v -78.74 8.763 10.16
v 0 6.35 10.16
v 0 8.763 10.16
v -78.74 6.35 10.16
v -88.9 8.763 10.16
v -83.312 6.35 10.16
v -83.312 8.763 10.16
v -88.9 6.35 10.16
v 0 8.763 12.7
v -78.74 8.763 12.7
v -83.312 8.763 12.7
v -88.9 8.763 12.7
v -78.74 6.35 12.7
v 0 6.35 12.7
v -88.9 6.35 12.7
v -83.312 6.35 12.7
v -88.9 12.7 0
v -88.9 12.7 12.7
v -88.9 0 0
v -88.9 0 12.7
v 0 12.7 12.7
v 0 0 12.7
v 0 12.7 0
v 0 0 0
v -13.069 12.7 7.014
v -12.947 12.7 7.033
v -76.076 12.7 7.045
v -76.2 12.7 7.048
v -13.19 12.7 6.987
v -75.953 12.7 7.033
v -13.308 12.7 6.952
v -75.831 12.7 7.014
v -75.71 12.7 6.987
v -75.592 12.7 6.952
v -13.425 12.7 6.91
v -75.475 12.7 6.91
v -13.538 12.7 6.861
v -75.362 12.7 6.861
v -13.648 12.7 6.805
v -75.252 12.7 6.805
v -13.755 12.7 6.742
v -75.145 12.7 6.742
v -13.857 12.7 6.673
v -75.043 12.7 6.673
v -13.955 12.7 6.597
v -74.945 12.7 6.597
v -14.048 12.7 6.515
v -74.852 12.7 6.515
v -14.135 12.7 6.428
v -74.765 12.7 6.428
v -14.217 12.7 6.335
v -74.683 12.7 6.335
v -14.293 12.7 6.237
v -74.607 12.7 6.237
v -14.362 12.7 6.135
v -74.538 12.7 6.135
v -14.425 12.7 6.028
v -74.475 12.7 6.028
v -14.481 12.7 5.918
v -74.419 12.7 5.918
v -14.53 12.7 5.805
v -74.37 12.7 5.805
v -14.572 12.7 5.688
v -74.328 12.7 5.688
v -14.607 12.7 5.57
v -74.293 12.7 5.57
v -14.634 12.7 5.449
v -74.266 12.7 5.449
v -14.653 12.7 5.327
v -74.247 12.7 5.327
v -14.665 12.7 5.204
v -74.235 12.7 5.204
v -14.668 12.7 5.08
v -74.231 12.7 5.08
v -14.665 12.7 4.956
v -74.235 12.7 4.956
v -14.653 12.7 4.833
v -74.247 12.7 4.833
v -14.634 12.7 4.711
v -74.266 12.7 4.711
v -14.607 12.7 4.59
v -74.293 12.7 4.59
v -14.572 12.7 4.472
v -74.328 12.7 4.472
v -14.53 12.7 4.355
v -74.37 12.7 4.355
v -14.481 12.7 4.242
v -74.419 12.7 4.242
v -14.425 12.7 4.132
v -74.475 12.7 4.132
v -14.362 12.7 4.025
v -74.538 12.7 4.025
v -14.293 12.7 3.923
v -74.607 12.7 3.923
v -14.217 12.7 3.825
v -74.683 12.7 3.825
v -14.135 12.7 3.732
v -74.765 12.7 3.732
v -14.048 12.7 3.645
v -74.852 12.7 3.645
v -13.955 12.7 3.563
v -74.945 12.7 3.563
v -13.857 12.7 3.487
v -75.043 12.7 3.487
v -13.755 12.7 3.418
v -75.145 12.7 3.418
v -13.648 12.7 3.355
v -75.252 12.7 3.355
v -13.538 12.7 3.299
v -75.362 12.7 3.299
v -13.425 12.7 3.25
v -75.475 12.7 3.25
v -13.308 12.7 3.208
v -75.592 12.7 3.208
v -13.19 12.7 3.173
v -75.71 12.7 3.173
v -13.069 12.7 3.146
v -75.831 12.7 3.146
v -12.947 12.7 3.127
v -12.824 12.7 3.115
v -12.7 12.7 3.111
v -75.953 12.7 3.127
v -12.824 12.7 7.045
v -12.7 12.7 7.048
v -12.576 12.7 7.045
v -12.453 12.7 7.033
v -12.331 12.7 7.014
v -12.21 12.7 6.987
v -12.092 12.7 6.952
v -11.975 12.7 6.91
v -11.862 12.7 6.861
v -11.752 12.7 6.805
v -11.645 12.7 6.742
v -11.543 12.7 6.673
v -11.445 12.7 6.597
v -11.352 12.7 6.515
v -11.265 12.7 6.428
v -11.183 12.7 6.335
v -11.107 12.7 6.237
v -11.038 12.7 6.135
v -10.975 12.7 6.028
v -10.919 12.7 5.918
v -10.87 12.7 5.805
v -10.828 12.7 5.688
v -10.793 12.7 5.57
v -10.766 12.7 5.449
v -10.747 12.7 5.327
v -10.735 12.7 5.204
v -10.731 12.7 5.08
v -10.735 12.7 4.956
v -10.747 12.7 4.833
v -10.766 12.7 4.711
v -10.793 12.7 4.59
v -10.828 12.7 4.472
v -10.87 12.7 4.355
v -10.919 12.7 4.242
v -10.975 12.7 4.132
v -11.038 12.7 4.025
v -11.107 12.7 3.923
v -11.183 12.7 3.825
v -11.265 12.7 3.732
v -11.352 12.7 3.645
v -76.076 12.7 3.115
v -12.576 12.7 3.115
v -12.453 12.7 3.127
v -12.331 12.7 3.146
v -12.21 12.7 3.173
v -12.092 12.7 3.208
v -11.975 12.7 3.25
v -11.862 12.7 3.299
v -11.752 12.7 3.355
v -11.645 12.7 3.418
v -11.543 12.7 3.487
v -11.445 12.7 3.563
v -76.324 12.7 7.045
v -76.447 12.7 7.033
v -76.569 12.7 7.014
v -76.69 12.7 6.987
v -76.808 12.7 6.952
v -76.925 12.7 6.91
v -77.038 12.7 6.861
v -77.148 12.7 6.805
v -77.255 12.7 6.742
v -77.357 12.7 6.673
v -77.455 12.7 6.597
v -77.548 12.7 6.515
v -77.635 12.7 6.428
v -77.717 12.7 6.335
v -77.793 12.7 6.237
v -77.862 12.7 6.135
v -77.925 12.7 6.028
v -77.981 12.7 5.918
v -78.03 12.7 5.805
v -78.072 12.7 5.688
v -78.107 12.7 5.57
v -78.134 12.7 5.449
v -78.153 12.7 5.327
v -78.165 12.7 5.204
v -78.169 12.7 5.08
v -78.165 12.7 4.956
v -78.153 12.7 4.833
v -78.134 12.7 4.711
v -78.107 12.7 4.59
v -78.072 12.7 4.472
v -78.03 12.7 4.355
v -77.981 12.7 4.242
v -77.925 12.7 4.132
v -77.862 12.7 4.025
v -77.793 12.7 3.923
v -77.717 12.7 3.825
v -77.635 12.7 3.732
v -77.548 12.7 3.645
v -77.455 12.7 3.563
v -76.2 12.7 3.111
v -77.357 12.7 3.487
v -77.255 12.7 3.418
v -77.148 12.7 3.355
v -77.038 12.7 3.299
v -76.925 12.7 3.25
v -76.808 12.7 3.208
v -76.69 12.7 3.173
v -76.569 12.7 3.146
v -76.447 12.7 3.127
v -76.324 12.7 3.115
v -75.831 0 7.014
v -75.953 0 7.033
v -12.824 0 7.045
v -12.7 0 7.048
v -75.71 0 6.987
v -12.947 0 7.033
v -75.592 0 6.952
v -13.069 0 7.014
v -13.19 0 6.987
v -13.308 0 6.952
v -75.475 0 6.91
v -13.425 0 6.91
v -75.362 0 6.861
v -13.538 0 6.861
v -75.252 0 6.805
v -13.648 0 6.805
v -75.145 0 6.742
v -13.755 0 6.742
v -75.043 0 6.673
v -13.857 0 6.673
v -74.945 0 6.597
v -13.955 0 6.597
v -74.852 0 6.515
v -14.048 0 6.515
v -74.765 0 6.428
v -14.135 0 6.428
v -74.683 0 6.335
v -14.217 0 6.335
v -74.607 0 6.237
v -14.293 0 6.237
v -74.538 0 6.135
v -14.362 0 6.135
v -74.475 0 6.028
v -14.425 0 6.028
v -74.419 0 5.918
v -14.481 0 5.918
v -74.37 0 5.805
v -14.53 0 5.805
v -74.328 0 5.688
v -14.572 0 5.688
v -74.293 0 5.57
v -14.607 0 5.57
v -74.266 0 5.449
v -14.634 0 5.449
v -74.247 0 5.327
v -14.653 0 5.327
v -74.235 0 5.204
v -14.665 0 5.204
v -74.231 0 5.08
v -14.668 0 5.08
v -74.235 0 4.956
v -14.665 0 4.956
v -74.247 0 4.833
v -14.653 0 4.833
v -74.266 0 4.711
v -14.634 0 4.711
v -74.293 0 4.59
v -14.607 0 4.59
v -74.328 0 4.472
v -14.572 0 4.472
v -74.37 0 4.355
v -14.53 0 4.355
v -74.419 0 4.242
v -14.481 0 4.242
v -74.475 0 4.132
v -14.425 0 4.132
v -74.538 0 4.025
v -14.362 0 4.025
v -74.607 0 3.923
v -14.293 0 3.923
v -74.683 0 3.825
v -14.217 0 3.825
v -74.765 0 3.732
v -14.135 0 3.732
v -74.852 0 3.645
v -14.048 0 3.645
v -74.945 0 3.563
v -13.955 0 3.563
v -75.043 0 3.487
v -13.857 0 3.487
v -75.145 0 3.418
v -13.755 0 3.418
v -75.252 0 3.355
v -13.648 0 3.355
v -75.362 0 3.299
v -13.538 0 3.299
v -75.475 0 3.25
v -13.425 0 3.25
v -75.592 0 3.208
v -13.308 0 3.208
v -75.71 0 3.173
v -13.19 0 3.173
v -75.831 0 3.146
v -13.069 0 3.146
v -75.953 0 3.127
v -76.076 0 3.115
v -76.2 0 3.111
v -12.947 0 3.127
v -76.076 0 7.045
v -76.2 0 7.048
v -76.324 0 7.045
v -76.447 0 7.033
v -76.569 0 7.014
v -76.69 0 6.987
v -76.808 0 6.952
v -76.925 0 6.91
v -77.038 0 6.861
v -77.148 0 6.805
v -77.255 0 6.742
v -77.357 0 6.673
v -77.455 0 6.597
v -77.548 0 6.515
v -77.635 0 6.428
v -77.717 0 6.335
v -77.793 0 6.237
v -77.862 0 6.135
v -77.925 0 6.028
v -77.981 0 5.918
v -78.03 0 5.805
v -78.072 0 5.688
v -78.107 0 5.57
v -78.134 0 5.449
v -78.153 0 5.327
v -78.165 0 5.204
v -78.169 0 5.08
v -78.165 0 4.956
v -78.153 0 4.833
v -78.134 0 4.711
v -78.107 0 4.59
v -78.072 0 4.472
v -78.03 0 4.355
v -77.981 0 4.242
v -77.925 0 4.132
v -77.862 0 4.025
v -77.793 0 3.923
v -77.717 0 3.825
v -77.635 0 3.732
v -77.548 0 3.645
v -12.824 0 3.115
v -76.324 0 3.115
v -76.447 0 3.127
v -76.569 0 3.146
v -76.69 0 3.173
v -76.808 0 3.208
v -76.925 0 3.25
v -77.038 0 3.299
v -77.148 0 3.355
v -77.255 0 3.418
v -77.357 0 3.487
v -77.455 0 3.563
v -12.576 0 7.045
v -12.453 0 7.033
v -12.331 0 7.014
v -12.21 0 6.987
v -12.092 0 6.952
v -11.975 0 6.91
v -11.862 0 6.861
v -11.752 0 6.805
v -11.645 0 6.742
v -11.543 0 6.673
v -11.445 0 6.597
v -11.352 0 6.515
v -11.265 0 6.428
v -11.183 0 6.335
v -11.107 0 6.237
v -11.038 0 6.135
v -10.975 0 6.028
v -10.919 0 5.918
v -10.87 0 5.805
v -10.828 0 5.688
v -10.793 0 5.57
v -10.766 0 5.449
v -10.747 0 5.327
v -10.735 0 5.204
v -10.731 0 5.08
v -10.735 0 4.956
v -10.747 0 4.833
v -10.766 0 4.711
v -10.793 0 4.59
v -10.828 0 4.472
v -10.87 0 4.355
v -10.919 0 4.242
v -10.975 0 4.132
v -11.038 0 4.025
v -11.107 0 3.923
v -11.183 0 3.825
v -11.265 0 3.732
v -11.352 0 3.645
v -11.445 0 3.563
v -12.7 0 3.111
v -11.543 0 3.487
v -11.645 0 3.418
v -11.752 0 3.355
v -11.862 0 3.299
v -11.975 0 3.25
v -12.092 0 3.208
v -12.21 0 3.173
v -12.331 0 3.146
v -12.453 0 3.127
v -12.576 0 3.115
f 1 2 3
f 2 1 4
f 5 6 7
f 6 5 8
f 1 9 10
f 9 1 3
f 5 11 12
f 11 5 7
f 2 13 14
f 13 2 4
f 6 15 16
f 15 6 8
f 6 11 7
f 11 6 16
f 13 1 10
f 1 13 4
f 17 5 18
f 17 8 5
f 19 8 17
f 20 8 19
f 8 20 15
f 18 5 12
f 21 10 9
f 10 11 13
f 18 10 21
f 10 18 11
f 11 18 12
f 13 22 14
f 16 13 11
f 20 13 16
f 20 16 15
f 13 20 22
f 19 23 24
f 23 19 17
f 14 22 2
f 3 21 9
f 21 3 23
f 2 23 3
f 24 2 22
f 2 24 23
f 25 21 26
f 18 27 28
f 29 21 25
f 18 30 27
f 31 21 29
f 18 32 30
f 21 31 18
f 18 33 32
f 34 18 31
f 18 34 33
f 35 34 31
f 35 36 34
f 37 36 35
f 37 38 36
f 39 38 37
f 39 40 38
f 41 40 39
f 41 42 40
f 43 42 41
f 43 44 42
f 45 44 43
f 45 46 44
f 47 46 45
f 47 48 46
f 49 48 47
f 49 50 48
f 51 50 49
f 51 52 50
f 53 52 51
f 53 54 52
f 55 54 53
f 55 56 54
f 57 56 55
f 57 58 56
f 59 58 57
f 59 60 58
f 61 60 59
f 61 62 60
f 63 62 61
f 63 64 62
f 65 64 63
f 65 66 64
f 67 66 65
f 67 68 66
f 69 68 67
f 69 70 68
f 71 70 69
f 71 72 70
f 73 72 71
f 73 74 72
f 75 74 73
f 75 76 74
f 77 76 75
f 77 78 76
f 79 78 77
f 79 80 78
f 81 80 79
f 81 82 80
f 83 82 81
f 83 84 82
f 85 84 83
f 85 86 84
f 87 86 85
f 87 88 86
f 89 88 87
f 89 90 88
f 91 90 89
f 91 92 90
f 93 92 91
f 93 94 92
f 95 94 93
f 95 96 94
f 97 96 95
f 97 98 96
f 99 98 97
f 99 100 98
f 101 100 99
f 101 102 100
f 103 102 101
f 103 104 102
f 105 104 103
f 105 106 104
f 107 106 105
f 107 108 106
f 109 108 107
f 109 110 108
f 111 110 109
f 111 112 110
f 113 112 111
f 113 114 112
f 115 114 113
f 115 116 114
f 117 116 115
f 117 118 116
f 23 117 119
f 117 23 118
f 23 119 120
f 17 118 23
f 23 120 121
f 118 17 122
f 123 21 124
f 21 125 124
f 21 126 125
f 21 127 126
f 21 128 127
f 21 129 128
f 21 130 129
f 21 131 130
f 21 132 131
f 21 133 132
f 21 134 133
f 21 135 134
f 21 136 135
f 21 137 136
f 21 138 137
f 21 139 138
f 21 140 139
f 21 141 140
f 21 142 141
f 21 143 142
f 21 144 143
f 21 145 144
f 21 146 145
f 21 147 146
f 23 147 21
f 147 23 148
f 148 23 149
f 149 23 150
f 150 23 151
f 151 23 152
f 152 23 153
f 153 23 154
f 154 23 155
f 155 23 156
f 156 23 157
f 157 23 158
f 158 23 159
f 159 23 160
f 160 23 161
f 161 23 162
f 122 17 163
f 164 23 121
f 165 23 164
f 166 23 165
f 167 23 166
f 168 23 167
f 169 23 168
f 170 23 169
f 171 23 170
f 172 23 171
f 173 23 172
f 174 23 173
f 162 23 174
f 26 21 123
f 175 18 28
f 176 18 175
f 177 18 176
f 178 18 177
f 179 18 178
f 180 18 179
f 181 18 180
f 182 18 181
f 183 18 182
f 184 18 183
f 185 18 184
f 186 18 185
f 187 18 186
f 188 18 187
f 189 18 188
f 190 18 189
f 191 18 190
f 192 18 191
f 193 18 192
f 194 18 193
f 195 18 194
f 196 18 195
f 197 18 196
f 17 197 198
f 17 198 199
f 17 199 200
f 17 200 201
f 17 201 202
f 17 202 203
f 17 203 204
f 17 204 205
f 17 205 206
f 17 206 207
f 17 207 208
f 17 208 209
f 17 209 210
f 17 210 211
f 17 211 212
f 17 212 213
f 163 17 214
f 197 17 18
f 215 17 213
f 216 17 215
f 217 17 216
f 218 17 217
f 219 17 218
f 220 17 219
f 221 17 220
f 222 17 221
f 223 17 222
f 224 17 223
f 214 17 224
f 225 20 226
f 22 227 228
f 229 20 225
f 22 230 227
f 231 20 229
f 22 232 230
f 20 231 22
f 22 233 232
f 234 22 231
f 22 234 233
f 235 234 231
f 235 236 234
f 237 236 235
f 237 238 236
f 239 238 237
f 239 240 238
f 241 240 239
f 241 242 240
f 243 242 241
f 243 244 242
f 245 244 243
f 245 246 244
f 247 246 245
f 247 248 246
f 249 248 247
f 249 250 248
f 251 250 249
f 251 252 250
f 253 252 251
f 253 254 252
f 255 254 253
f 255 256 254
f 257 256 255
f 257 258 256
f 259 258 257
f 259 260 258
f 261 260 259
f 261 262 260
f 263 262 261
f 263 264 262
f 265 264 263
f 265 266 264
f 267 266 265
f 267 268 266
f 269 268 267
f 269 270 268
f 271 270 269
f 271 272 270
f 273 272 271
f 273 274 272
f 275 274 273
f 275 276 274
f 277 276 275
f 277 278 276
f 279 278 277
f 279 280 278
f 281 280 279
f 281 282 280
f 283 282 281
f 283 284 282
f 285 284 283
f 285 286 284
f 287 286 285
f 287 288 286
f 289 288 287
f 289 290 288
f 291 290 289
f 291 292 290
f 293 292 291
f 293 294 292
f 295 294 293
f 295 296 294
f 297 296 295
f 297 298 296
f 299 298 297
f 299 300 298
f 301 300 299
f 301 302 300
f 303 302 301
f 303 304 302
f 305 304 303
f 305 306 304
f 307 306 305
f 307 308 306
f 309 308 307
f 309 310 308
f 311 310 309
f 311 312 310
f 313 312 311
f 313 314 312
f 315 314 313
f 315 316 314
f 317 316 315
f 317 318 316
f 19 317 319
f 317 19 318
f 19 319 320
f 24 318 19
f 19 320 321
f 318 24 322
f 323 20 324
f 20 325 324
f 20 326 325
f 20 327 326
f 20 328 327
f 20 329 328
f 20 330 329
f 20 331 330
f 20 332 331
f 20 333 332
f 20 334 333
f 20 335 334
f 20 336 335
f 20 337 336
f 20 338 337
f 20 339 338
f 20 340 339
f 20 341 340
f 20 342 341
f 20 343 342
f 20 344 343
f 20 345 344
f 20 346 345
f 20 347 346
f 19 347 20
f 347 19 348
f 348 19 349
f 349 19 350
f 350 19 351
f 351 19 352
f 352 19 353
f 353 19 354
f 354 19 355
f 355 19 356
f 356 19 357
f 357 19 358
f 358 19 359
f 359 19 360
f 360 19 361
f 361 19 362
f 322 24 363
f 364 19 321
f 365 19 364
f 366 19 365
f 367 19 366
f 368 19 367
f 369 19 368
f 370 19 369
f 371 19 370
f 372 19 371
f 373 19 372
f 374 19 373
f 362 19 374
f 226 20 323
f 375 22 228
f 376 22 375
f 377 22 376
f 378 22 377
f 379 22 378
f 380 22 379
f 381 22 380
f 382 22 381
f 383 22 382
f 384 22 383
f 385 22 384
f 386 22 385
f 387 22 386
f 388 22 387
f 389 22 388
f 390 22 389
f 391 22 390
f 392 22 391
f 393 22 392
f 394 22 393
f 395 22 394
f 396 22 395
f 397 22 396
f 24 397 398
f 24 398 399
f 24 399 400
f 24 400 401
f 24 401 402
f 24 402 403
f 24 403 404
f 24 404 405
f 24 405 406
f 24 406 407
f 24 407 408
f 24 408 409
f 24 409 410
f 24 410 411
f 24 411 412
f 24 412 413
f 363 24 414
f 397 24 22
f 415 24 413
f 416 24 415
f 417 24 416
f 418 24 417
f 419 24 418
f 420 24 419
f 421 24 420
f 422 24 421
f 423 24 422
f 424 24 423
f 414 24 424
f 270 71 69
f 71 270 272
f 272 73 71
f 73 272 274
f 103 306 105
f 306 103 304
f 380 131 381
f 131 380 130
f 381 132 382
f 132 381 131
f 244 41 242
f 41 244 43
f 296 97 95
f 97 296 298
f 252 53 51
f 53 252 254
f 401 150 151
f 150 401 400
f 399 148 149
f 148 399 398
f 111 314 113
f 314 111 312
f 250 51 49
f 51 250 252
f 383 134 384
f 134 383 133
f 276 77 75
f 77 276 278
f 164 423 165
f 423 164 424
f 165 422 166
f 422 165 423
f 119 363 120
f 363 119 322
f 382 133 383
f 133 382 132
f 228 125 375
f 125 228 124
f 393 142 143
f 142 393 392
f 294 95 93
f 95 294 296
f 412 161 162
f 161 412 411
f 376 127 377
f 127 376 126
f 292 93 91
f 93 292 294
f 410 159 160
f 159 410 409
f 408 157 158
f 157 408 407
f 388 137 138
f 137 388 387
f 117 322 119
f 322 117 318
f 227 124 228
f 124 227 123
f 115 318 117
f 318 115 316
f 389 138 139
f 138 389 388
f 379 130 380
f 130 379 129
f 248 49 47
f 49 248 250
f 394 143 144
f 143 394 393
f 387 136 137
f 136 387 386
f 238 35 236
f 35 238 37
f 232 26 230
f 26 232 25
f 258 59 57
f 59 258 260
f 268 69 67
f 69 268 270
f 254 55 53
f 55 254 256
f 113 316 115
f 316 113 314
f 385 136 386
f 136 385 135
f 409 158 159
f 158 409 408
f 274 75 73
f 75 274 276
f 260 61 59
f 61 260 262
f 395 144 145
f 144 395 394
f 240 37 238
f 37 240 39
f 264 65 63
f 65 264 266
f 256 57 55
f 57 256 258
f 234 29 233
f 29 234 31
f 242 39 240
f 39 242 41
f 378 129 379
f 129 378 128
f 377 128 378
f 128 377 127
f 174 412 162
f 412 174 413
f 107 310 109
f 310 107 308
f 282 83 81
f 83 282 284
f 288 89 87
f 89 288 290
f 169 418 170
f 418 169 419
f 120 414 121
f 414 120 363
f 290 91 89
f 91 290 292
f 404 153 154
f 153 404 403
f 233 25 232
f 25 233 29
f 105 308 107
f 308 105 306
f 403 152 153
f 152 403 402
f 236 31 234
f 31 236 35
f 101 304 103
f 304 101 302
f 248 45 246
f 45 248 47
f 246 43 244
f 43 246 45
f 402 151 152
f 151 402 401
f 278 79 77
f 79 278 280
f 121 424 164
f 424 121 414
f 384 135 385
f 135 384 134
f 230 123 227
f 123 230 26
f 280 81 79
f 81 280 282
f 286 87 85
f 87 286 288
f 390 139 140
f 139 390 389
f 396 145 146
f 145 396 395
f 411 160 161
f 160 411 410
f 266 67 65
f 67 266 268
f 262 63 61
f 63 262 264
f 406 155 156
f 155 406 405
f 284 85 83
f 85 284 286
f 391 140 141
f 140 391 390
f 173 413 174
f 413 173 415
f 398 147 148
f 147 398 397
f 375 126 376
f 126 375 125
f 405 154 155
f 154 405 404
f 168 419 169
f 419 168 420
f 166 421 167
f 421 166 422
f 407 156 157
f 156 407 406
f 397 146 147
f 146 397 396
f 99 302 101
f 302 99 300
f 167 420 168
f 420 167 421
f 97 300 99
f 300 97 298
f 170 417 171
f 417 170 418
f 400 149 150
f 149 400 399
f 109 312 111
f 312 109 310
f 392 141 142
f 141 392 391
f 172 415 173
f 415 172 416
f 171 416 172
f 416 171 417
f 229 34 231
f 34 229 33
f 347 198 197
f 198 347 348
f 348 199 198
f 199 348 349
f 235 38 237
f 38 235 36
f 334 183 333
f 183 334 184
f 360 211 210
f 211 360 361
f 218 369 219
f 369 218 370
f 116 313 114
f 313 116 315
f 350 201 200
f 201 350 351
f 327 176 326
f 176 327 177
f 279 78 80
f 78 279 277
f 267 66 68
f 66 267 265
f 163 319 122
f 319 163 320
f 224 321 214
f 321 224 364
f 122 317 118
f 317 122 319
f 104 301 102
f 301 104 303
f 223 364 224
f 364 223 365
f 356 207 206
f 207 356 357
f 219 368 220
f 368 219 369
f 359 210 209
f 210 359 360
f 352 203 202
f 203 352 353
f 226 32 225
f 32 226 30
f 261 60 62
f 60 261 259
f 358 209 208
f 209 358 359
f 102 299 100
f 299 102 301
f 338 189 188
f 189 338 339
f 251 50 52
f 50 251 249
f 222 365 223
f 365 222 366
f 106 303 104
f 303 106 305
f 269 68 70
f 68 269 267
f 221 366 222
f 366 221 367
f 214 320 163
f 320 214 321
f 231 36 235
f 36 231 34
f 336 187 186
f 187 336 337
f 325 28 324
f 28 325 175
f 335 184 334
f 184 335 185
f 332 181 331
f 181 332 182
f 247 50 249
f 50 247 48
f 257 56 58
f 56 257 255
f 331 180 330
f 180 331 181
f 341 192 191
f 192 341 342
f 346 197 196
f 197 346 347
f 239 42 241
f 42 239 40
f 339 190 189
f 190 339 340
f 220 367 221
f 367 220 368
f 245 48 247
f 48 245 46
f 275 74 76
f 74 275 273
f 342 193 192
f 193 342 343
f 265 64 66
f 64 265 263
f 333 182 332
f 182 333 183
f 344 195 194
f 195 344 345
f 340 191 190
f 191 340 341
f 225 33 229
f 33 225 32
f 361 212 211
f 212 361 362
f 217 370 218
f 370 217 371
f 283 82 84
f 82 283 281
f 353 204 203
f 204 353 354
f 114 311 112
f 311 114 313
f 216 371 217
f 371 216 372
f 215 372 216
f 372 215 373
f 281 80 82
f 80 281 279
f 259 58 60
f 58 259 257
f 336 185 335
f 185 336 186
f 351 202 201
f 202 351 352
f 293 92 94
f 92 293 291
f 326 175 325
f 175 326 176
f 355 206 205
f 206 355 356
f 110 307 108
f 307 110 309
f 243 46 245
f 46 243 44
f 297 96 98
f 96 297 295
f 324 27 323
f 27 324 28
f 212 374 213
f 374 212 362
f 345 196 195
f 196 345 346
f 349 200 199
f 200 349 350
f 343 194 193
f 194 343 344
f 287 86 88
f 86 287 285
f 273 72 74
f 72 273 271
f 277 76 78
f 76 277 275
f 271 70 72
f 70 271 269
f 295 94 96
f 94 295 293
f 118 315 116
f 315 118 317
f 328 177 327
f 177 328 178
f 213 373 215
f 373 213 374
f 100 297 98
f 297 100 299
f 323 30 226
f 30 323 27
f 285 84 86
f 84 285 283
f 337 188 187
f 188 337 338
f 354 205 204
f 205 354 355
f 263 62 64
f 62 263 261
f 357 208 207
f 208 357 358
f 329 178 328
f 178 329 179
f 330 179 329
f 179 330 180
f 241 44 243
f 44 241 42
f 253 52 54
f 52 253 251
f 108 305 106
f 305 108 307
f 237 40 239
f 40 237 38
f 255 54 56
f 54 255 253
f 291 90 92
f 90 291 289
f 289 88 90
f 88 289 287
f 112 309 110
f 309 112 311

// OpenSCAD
/* OpenSCAD file to make a pair of rails to hold
 * one of my Antminer X9 boards
 * Tom Trebisky  5-10-2026
 */

/* I design this so it will print slot upwards
 */

// right = true;
right = false;

mmpi = 25.4;
function mm(x) = x * mmpi;

l = mm ( 3.5 );		// length along the PCB
h = mm ( 0.5 );		// thickness
w = mm ( 0.5 );		// perpendicular to card edge
up = mm ( 0.4 );
shift = mm ( 0.25 );
half = mm ( 0.5 );

// [left/right, front/back, up/down ]

slice = mm ( 0.095 );
big1 = mm ( 1.0 );
big2 = mm ( 2.0 );
big4 = mm ( 4.0 );

// d_diam = mm ( 3.0 / 16.0 );
d_diam = mm ( 0.155 );
d_len = w + mm ( 1.5 );
// d_shift = mm ( -0.5 );
// d_shift = mm ( 0.0 );
d_up = mm ( 0.2 );
// d_over1 = mm ( 0.25 );
d_over1 = mm ( 0.5 );
d_over2 = mm ( 3.0 );

/* This dimension is critical, as it is the piece
 * that fits into the slot on the PCB.
 * It comes out 0.210 when printed as 0.20
 */
// bite_l = mm ( 0.20 );
bite_l = mm ( 0.180 );

bite_pos = mm ( 3.1 );

// locations of drill holes
x1 = mm ( 0.4 );
y1 = mm ( 0.4 );

module drill (x, y) {
    // translate ( [ x, y, d_shift] )
	rotate ( [ 90.0, 0.0, 0.0 ] )
    translate ( [ x, y, 0.0 ] )
    translate ( [ 0.0, 0.0, -d_len/2.0 ] )
    cylinder ( d=d_diam, h=d_len, $fn=100 );
}

module rail () {
		cube ( [ l, h, w ] );
}

module bite () {
	translate ( [ bite_pos, 0.0, 0.0 ] )
		cube ( [ bite_l, half, big1 ] );
}

module slab () {
 	difference () {
		translate ( [ -shift, shift, up ] )
			cube ( [ big4, slice, big1 ] );
		bite ();
	}
}

module thing () {
	difference () {
		rail ();
		slab ();
		drill ( d_over1, d_up );
		drill ( d_over2, d_up );
	}
}

// [left/right, front/back, up/down ]

if ( right )
    thing ();
else
    mirror ( [ 1, 0, 0 ] )
		thing ();

// slab ();

// drill ( big1, d_up );
// drill ( d_over, d_up );

// THE END
